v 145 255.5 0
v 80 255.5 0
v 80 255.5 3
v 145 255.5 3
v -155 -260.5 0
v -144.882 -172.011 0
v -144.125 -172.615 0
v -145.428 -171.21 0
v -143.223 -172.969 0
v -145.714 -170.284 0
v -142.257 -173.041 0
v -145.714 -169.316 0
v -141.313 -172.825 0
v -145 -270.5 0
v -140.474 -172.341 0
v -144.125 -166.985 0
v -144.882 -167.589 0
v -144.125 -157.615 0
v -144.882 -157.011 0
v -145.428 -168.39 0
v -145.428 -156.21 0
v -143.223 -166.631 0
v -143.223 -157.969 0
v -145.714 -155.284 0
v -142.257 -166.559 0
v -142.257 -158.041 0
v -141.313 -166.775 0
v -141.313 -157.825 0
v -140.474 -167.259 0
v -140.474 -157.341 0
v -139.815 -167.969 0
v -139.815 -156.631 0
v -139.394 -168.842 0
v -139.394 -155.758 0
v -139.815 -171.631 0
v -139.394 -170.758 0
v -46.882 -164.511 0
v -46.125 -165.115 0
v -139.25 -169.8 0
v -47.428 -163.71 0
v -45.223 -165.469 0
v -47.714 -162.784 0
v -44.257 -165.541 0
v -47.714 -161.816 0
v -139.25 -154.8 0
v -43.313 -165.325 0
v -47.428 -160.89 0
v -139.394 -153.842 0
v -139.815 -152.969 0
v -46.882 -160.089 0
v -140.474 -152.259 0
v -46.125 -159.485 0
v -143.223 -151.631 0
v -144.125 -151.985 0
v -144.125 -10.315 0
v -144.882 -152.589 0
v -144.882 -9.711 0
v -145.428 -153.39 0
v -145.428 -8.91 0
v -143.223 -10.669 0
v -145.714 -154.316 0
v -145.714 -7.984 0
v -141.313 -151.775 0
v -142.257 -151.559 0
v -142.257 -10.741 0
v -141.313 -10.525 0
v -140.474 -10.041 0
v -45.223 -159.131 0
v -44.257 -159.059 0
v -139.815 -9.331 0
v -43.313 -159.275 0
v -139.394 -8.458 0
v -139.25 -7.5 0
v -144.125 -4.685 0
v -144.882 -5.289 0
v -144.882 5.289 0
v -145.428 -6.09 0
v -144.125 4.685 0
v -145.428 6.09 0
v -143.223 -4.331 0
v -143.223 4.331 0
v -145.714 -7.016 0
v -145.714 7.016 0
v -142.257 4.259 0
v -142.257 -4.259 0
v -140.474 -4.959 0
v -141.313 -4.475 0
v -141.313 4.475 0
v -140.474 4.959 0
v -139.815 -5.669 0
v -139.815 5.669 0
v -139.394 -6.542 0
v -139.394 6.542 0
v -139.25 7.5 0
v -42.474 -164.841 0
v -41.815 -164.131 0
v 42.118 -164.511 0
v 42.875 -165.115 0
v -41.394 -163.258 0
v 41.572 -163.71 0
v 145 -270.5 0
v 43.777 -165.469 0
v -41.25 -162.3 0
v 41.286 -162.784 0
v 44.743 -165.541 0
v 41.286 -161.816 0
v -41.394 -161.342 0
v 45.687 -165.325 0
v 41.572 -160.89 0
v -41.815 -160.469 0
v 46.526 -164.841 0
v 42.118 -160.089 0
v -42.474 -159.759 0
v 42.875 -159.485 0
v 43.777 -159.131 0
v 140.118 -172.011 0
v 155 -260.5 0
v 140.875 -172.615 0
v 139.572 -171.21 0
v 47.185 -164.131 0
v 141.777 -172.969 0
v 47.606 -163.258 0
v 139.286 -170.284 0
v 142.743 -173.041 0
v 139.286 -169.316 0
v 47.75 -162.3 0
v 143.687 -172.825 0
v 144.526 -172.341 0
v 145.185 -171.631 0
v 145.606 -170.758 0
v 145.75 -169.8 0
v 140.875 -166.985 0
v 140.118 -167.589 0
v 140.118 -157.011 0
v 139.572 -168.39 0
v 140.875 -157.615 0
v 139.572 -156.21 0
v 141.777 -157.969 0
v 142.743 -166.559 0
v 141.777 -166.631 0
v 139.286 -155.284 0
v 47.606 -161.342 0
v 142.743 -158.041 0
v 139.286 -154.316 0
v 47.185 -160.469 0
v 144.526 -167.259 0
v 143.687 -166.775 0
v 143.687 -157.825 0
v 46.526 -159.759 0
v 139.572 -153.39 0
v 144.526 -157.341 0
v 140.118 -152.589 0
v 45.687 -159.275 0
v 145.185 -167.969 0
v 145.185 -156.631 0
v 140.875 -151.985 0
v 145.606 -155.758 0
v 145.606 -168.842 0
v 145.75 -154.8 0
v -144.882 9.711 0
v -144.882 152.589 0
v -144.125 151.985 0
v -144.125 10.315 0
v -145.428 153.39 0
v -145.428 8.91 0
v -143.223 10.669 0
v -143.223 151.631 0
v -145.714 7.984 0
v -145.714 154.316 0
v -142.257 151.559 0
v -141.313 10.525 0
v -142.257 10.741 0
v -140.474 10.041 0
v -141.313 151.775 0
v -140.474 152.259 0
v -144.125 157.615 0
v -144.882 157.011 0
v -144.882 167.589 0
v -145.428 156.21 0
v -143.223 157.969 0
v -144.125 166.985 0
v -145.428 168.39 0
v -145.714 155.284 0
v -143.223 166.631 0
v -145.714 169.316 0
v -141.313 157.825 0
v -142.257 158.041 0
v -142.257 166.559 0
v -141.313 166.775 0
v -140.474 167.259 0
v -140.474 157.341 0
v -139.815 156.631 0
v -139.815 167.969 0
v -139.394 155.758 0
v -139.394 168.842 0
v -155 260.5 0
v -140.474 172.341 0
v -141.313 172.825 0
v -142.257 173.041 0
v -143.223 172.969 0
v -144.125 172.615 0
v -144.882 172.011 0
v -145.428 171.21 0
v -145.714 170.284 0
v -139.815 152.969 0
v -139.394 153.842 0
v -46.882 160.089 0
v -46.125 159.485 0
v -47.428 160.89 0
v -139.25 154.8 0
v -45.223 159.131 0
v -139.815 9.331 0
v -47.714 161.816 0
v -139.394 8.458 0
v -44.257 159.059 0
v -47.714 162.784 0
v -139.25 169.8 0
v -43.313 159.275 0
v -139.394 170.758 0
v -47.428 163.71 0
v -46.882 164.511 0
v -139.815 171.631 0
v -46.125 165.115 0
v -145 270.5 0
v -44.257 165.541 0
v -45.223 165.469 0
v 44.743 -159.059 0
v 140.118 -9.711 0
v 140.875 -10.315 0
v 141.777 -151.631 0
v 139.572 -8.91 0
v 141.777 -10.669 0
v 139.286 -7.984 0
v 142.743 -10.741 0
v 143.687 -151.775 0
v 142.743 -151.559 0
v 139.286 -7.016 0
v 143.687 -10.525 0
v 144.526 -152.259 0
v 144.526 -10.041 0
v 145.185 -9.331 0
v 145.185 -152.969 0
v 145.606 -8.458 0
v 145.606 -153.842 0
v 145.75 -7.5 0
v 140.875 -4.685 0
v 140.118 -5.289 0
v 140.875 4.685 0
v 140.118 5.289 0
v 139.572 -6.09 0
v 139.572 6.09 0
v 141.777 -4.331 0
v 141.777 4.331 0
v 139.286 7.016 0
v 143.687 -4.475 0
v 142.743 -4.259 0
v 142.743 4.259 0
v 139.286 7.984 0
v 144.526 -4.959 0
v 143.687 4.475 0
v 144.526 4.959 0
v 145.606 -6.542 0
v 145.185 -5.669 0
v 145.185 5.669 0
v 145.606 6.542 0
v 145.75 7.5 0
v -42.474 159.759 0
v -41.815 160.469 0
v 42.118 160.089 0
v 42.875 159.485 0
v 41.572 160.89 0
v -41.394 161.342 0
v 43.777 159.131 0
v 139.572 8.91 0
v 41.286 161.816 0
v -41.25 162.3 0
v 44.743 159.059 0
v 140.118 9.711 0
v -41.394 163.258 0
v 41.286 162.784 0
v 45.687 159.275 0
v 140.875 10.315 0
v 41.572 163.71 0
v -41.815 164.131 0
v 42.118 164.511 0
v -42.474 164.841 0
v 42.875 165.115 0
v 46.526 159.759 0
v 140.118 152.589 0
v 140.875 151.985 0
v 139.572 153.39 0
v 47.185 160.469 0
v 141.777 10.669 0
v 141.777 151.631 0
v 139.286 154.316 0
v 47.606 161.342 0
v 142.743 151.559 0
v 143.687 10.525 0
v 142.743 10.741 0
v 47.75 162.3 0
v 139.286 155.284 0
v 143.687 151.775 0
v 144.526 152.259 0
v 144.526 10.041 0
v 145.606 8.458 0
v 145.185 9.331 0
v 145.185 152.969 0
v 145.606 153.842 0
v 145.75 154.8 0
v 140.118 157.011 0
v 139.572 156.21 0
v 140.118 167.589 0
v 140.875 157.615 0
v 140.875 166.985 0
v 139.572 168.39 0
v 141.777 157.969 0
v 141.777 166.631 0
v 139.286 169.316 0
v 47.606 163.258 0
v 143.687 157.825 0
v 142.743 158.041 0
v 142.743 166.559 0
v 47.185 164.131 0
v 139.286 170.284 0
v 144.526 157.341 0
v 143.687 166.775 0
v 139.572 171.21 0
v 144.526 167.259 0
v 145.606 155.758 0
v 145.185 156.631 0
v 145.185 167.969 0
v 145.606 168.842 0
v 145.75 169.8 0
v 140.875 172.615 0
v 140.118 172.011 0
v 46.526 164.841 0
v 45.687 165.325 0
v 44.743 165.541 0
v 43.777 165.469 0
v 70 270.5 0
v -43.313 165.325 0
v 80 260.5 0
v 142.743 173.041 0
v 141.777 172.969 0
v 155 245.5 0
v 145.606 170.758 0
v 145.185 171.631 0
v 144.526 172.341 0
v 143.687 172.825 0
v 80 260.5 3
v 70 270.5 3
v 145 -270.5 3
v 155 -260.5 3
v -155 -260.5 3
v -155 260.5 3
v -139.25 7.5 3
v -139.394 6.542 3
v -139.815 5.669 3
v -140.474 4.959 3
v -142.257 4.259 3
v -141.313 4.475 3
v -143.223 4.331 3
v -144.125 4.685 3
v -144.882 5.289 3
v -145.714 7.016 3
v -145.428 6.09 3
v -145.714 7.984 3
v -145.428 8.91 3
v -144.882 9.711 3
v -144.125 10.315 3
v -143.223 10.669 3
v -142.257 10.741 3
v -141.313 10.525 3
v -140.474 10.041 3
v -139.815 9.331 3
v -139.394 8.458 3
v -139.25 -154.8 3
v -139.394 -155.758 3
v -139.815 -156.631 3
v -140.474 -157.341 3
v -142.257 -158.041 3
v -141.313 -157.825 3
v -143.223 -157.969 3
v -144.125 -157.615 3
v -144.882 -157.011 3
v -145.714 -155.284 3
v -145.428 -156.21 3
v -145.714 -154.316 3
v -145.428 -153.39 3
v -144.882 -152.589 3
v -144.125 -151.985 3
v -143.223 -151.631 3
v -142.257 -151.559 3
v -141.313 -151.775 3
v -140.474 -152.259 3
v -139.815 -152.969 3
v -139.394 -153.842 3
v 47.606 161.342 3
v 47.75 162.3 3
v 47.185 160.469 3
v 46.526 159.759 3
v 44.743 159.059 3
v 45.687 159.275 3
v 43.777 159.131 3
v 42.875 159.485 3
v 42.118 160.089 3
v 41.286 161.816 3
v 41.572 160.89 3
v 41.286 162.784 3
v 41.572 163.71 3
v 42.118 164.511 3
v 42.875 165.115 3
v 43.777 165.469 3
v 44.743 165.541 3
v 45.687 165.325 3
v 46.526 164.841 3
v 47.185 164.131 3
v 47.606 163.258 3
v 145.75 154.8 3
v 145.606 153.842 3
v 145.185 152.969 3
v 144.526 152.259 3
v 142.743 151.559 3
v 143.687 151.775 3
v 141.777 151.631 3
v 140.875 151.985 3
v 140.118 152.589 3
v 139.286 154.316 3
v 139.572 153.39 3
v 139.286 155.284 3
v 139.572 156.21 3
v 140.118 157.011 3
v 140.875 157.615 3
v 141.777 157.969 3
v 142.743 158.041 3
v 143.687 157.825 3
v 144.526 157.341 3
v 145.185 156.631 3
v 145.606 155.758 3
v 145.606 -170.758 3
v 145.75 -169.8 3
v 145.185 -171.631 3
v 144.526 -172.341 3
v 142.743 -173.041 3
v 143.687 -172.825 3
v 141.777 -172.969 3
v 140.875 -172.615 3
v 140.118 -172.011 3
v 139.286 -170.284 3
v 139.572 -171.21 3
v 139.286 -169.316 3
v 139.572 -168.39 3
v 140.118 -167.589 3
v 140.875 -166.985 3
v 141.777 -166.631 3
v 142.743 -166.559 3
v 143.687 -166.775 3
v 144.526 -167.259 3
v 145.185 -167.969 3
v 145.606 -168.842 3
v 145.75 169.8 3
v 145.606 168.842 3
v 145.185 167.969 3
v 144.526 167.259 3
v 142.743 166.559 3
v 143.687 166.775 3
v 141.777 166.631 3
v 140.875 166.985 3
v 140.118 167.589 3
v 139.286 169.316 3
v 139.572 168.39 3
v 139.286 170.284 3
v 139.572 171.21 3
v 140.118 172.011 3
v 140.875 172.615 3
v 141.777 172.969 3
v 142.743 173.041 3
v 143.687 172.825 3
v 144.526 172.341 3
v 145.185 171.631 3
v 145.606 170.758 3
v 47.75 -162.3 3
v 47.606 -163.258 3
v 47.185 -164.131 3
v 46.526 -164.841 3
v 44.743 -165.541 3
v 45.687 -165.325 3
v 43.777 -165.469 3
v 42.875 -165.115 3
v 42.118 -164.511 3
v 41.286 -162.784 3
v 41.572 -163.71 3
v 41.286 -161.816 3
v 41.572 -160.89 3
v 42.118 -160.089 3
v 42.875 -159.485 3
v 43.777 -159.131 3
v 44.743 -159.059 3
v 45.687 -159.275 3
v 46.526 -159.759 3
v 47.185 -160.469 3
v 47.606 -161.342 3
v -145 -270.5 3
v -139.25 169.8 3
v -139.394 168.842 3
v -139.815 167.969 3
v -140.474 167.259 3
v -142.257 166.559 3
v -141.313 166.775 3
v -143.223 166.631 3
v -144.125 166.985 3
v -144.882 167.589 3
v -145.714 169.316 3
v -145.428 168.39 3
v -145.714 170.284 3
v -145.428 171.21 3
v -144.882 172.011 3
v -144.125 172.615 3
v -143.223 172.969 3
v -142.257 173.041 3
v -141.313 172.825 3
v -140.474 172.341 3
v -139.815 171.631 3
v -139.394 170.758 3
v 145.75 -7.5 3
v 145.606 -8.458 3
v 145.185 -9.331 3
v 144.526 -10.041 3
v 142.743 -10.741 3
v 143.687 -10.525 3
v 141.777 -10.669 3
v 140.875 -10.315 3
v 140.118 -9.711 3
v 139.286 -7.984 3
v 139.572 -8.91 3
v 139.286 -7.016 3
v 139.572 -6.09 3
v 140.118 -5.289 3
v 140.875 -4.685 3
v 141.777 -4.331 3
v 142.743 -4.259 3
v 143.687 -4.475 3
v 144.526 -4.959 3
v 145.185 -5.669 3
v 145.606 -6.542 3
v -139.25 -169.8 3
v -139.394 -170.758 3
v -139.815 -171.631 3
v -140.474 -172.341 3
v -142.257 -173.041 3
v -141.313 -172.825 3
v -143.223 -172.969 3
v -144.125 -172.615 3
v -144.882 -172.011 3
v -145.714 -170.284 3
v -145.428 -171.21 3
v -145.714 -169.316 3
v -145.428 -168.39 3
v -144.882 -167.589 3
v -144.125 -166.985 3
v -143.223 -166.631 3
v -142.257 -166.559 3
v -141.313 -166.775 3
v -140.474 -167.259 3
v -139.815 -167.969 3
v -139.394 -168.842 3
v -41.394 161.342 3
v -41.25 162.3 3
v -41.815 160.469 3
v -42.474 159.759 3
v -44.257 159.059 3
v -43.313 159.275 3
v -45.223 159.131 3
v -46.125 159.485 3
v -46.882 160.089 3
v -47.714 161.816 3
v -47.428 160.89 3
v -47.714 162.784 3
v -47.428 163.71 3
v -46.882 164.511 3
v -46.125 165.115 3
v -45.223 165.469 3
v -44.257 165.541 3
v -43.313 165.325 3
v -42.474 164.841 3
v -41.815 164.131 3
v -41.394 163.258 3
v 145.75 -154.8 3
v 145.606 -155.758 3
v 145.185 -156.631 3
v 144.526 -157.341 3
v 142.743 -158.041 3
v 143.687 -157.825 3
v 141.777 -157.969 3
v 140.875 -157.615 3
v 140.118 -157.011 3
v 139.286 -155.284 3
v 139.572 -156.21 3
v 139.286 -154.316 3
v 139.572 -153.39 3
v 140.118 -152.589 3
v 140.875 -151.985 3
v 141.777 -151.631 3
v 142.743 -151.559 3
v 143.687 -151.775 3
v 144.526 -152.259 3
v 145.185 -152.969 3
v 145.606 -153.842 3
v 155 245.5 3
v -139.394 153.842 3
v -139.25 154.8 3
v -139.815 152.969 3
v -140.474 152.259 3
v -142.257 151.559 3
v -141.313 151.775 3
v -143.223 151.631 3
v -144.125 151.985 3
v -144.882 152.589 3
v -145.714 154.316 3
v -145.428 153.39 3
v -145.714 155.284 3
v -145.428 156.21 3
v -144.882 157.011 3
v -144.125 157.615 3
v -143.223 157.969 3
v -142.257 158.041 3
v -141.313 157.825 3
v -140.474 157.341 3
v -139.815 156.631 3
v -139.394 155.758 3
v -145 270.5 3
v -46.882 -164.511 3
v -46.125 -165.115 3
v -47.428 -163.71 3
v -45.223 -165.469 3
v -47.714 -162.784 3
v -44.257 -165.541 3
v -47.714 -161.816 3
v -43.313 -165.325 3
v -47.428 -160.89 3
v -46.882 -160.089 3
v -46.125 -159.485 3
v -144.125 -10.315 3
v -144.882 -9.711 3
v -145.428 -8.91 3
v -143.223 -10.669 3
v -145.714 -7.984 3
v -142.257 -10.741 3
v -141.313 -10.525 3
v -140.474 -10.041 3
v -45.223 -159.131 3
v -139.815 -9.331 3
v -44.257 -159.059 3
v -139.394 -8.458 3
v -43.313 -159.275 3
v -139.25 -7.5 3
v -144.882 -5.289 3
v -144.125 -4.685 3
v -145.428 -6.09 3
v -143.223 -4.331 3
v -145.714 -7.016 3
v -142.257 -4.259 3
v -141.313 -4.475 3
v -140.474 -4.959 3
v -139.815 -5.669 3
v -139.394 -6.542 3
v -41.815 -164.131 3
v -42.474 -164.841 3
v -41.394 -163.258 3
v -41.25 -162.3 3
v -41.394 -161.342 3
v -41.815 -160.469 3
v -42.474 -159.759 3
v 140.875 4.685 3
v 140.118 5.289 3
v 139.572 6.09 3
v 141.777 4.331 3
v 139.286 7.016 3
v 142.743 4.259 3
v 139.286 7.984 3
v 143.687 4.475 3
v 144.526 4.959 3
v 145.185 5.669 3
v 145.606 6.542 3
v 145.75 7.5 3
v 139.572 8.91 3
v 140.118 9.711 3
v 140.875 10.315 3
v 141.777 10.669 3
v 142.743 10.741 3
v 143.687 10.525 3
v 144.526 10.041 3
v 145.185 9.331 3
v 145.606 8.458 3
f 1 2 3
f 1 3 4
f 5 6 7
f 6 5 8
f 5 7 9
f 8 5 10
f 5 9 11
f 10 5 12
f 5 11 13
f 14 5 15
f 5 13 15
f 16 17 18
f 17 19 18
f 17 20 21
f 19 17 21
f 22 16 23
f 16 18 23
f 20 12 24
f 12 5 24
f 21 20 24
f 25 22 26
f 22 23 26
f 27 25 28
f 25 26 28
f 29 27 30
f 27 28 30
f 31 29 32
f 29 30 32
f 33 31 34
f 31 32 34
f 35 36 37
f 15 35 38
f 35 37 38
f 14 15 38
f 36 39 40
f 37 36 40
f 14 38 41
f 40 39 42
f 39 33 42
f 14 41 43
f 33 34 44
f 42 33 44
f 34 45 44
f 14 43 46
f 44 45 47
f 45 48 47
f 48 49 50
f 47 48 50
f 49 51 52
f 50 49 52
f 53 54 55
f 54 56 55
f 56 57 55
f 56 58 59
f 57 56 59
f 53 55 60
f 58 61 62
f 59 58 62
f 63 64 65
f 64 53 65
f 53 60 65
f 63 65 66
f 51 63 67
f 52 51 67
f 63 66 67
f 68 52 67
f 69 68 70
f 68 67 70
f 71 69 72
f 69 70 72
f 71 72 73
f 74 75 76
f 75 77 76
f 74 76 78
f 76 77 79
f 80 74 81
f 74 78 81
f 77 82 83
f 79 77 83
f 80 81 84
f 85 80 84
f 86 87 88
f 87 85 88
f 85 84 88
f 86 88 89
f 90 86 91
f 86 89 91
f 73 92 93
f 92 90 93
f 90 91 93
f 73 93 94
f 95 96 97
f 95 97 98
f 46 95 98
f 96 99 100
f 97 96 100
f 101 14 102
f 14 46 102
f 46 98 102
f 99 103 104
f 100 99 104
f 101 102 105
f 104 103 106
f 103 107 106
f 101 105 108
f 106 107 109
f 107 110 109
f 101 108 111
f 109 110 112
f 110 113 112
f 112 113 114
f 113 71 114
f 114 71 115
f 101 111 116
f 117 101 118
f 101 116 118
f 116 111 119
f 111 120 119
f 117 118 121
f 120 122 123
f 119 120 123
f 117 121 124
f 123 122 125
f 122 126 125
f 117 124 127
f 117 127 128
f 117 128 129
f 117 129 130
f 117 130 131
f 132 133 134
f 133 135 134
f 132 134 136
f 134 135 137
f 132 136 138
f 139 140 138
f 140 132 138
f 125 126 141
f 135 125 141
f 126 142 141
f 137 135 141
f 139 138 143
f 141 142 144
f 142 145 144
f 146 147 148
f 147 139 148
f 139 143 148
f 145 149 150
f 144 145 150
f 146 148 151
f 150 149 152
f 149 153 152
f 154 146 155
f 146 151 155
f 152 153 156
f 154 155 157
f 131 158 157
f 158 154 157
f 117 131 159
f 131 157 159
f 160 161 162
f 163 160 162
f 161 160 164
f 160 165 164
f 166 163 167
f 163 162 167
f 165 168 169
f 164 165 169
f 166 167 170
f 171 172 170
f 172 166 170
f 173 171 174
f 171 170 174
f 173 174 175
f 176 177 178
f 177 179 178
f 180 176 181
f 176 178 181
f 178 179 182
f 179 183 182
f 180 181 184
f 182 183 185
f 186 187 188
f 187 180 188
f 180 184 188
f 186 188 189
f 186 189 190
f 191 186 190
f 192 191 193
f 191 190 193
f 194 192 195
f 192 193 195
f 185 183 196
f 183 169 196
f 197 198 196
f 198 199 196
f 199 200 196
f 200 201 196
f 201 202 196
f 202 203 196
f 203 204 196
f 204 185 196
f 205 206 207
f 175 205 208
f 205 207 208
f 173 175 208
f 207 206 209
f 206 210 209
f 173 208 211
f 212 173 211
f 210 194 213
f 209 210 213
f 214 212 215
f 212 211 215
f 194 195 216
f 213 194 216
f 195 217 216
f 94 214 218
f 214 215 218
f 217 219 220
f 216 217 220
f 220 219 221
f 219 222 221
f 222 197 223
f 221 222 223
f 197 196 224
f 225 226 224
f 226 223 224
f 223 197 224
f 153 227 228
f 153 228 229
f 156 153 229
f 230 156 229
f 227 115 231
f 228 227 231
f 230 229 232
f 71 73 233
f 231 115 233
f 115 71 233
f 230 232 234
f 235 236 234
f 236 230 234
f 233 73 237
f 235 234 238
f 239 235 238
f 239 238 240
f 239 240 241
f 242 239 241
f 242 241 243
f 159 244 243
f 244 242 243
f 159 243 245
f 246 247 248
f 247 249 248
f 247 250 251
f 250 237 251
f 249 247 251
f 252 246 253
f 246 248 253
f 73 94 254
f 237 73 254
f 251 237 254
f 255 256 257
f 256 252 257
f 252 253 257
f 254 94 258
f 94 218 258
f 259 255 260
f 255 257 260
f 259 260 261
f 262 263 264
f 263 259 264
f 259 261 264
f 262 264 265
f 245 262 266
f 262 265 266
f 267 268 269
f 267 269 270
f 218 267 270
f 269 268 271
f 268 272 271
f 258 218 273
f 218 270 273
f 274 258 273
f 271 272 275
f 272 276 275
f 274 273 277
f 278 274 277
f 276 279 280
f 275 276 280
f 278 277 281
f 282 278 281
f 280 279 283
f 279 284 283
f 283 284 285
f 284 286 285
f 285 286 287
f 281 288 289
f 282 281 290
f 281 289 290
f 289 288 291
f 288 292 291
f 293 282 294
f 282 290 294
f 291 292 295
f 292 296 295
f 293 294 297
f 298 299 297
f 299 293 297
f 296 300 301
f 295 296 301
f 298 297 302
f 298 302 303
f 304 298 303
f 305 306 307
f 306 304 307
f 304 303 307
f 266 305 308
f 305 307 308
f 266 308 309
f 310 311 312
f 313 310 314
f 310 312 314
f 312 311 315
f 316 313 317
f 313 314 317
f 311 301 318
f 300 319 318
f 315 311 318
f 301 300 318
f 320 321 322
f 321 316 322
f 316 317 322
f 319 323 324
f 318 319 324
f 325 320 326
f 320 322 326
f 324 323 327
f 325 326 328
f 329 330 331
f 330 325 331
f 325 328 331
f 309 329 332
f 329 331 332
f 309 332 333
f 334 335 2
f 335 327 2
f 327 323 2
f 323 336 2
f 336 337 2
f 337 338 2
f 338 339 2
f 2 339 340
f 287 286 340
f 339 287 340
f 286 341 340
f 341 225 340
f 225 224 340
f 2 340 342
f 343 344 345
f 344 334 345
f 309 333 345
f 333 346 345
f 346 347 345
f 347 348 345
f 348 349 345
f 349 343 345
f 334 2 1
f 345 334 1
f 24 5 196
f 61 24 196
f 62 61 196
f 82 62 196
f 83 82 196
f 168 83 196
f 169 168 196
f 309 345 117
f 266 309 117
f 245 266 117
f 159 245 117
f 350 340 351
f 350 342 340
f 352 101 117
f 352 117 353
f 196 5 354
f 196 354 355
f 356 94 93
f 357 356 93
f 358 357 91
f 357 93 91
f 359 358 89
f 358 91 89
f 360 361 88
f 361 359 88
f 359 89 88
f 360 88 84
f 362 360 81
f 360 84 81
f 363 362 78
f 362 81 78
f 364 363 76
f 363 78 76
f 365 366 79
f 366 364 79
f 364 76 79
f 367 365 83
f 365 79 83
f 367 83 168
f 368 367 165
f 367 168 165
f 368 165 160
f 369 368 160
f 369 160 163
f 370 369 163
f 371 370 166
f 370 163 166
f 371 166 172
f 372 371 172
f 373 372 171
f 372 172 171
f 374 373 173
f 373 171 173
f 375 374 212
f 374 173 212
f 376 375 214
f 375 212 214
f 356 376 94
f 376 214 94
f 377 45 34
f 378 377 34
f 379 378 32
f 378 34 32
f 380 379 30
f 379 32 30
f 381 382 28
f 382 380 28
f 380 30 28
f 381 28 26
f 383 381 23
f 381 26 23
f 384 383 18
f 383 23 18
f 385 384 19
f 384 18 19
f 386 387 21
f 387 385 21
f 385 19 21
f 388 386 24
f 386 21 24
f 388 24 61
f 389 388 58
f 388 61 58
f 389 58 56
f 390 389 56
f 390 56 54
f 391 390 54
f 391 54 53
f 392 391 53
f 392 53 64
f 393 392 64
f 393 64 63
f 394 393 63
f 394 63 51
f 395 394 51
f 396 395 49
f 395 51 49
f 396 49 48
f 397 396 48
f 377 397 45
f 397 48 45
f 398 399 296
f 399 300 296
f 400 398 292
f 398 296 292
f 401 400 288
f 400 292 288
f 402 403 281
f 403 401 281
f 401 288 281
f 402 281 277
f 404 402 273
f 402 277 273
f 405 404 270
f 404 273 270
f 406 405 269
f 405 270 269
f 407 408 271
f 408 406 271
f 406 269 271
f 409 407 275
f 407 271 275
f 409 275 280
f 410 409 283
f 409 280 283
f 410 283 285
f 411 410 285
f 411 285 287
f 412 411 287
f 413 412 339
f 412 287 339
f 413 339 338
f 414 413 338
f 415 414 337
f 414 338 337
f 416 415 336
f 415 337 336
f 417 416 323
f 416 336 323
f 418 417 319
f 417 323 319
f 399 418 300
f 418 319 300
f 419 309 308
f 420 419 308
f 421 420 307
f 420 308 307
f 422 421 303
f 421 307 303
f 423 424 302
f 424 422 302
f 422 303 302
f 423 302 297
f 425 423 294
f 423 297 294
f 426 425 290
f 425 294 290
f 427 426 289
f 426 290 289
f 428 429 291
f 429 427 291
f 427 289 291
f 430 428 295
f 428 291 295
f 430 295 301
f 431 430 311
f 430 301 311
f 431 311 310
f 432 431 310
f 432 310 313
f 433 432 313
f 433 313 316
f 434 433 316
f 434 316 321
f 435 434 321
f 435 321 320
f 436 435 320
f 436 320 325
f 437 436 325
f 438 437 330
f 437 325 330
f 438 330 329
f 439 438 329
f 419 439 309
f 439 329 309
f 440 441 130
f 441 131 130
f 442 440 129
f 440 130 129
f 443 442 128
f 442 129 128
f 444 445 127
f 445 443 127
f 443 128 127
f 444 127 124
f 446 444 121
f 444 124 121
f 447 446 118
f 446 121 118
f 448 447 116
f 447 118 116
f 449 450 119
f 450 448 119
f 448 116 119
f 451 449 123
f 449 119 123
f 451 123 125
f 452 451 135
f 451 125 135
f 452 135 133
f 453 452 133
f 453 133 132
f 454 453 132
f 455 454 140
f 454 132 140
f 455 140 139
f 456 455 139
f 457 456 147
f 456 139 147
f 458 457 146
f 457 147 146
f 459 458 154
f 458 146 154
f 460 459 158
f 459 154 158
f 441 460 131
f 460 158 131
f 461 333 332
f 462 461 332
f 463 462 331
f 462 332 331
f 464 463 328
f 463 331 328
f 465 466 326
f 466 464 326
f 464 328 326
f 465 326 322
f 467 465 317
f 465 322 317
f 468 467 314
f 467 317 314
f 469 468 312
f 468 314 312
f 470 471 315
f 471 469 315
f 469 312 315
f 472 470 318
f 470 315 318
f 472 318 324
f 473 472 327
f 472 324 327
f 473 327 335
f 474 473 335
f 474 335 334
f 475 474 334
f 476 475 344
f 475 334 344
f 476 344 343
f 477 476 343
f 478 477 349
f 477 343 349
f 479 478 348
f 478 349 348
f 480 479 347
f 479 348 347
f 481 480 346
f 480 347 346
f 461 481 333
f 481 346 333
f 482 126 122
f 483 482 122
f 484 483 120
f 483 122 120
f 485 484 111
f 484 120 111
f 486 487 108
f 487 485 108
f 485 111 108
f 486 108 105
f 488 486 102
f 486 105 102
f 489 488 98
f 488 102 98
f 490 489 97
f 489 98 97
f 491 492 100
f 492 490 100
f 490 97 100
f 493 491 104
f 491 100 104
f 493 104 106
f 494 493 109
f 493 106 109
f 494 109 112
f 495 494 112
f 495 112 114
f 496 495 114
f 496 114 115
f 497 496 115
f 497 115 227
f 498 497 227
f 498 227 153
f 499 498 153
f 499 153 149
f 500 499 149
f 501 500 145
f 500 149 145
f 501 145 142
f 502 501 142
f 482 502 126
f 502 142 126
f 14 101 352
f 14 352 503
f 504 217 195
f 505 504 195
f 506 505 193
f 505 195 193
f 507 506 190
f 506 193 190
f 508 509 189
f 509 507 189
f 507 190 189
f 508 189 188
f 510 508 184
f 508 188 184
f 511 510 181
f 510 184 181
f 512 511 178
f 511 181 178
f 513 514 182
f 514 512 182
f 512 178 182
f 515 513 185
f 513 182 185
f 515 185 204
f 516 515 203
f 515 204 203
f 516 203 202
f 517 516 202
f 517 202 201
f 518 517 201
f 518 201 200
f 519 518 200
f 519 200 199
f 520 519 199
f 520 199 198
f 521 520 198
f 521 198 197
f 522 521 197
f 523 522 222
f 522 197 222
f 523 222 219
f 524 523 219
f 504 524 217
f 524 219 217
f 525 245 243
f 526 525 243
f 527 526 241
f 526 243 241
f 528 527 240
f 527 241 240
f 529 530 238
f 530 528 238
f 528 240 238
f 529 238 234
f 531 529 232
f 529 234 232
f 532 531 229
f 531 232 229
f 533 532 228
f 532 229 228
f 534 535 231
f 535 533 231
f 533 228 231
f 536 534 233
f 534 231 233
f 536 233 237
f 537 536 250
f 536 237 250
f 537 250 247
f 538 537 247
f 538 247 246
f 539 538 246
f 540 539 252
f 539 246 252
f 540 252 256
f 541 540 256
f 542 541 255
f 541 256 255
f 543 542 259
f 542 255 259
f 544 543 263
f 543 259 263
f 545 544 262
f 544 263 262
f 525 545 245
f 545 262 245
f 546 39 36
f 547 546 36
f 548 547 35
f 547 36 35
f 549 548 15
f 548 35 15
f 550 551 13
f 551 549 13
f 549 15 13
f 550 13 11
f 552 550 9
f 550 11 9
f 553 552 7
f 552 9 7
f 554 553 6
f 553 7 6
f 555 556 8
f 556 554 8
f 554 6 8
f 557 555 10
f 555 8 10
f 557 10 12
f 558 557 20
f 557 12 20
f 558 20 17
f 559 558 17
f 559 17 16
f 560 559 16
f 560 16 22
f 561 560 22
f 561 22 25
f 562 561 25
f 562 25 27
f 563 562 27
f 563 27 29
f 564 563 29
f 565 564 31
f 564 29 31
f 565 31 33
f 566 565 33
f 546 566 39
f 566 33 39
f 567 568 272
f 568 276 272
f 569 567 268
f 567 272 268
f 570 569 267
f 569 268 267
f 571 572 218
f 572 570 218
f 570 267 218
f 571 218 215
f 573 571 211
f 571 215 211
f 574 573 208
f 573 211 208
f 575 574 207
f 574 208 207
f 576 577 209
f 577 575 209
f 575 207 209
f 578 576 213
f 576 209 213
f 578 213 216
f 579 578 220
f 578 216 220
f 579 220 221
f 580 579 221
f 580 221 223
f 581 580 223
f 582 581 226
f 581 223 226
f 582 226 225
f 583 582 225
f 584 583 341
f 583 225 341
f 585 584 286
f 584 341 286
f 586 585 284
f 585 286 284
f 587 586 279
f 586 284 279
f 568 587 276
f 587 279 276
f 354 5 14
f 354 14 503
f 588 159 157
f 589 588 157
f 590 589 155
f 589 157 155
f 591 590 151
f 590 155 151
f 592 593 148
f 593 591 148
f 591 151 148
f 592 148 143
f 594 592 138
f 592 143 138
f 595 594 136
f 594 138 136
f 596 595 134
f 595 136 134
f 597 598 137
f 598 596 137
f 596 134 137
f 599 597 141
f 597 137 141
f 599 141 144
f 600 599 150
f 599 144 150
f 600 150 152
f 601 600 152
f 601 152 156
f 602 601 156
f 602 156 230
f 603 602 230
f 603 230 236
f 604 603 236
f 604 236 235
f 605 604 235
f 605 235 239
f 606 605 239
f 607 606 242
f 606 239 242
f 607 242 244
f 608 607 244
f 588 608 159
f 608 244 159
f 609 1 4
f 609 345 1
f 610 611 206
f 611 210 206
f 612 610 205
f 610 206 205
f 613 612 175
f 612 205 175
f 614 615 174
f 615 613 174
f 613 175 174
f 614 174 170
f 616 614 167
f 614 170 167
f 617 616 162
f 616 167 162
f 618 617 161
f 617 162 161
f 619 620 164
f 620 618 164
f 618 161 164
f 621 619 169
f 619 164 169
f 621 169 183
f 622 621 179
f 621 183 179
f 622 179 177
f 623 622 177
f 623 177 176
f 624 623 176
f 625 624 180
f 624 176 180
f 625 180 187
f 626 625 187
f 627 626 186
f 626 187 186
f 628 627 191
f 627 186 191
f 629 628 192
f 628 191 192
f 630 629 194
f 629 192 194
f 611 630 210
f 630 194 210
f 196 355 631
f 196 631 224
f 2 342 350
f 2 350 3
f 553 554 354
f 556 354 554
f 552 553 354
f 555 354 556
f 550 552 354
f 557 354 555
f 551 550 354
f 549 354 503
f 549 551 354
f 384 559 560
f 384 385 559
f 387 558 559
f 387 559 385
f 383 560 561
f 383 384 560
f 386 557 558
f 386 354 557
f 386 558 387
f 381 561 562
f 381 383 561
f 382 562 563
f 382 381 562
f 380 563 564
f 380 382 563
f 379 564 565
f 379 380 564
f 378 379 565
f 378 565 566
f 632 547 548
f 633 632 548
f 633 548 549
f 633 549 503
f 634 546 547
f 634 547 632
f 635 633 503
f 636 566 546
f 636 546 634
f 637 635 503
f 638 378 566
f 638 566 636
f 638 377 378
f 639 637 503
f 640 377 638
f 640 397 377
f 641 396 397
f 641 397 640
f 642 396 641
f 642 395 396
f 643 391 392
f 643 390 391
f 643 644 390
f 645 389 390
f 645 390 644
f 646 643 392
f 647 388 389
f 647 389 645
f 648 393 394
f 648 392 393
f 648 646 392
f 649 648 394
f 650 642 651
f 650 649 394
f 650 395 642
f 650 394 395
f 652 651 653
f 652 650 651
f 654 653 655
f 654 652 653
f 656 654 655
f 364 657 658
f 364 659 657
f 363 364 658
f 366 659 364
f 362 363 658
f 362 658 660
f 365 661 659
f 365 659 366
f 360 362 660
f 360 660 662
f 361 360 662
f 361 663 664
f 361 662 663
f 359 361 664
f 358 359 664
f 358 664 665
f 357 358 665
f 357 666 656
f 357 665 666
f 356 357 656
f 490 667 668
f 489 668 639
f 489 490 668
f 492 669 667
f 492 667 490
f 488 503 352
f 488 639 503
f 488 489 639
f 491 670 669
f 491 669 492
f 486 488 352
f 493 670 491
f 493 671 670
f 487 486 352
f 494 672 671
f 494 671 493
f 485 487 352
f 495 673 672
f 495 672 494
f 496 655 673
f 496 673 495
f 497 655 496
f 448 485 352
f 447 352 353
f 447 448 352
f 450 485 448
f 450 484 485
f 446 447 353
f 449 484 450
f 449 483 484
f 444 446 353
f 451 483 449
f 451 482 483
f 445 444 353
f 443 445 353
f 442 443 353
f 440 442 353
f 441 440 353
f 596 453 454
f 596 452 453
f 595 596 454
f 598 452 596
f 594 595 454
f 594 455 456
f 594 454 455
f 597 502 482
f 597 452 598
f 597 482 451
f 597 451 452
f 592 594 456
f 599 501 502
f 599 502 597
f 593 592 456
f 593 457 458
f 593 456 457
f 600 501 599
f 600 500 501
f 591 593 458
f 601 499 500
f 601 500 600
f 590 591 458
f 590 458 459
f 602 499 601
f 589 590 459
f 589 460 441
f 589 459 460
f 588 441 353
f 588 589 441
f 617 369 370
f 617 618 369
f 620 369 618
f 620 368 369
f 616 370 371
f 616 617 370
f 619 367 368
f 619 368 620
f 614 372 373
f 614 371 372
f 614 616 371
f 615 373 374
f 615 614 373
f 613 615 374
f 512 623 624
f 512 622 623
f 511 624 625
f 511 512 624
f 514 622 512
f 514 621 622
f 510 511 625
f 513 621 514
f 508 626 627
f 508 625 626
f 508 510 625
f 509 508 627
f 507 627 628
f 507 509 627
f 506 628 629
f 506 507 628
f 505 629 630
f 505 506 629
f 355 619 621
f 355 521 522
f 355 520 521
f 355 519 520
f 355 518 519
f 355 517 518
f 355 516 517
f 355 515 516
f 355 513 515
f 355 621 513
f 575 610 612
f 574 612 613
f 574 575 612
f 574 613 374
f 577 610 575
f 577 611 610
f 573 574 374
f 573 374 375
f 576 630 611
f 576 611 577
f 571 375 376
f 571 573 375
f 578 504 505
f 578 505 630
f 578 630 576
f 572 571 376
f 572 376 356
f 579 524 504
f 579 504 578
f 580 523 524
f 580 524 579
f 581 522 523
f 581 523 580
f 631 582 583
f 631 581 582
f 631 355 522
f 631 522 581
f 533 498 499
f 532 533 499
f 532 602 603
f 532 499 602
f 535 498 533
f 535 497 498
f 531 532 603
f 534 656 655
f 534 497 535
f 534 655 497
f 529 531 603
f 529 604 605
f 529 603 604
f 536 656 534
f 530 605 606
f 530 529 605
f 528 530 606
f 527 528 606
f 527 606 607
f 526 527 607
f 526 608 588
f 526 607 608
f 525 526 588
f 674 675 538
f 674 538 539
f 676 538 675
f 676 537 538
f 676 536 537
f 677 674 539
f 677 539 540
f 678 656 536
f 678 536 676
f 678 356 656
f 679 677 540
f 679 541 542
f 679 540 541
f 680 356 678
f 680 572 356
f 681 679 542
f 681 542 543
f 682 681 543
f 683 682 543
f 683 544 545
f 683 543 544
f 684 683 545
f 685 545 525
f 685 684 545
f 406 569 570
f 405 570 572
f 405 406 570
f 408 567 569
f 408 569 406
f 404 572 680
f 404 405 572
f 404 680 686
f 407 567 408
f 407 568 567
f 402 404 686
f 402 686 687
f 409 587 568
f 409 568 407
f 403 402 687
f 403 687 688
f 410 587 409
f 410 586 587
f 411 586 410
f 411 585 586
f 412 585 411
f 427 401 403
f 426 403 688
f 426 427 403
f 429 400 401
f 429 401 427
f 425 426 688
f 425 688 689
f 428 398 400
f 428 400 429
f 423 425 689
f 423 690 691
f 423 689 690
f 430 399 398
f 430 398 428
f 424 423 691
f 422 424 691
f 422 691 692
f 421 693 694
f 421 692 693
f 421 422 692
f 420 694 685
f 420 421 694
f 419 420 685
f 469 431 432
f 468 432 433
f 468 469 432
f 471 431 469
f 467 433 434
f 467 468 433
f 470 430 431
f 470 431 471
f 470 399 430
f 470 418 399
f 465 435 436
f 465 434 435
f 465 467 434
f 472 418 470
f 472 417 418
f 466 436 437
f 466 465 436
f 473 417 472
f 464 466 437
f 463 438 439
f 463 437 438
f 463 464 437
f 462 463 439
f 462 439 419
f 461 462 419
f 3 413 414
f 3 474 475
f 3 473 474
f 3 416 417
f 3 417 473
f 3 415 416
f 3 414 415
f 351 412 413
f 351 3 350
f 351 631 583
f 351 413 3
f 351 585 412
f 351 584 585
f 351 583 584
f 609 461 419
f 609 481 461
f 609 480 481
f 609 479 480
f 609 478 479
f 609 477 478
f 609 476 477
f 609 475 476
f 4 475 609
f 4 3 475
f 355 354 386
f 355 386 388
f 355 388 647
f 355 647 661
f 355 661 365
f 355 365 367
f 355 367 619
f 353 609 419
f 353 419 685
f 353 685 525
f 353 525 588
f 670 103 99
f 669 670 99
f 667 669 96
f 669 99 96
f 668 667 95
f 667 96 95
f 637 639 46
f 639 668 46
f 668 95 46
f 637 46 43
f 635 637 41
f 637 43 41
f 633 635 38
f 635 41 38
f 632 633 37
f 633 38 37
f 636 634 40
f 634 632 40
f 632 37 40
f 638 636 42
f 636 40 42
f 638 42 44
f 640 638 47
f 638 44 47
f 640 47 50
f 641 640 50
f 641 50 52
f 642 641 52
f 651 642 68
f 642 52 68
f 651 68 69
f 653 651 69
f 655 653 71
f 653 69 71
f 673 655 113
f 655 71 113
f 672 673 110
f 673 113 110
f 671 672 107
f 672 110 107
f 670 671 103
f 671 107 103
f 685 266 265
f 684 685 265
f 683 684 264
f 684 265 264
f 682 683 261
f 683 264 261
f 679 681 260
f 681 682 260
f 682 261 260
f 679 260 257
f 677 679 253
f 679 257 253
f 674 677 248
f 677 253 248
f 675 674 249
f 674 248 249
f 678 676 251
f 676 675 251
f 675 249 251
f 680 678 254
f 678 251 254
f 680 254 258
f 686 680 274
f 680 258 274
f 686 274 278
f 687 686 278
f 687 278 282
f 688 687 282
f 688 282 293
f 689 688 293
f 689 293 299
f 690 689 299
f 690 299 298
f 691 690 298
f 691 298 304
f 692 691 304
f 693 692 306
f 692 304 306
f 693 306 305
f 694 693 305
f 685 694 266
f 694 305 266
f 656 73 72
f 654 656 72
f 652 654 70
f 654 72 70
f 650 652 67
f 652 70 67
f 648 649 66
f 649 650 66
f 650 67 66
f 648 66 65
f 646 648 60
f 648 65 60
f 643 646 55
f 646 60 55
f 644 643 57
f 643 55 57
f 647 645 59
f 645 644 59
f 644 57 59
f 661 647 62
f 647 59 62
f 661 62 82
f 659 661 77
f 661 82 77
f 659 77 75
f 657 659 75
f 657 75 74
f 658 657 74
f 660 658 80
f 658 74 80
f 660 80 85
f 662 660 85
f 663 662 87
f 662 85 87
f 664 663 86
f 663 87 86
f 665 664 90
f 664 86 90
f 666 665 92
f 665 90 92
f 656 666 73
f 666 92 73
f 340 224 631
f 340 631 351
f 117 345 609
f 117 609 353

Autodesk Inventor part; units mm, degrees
ref_plane "YZ Plane" through (0, 0, 0) normal (1, 0, 0) x (0, 1, 0)
ref_plane "XZ Plane" through (0, 0, 0) normal (0, 1, 0) x (-1, 0, 0)
ref_plane "XY Plane" through (0, 0, 0) normal (0, 0, 1) x (1, 0, 0)
sketch "Skizze1" plane through (0, 0, 0) normal (0, 0, 1) x (1, 0, 0)
  line L0 (-155, 270.5) -> (155, 270.5)
  line L1 (155, 270.5) -> (155, -270.5)
  line L2 (155, -270.5) -> (-155, -270.5)
  line L3 (-155, -270.5) -> (-155, 270.5)
  line L4 (-155, 270.5) -> (155, -270.5) construction
  line L5 (155, 270.5) -> (-155, -270.5) construction
  line L6 (-77.5, 270.5) -> (-77.5, -270.5) construction
  line L7 (0, 396.7) -> (0, -381.7) construction
  line L8 (-142.5, 270.5) -> (-142.5, -270.5) construction
  line L9 (-155, -162.3) -> (155, -162.3) construction
  circle A0 centre (-142.5, -154.8) radius 3.25
  circle A1 centre (-142.5, -169.8) radius 3.25
  line L10 (-232, 0) -> (307, 0) construction
  circle A2 centre (-142.5, 7.5) radius 3.25
  circle A3 centre (-142.5, -7.5) radius 3.25
  circle A4 centre (-142.5, 154.8) radius 3.25
  circle A5 centre (-142.5, 169.8) radius 3.25
  circle A6 centre (142.5, -154.8) radius 3.25
  circle A7 centre (142.5, -169.8) radius 3.25
  circle A8 centre (142.5, 7.5) radius 3.25
  circle A9 centre (142.5, -7.5) radius 3.25
  circle A10 centre (142.5, 169.8) radius 3.25
  circle A11 centre (142.5, 154.8) radius 3.25
  circle A12 centre (-44.5, -162.3) radius 3.25
  circle A13 centre (44.5, -162.3) radius 3.25
  circle A14 centre (-44.5, 162.3) radius 3.25
  circle A15 centre (44.5, 162.3) radius 3.25
  line L11 (230, 285.5) -> (80, 285.5) construction
  line L12 (80, 285.5) -> (80, 255.5)
  line L13 (80, 255.5) -> (230, 255.5)
  line L14 (230, 255.5) -> (230, 285.5) construction
  line L15 (230, 285.5) -> (80, 255.5) construction
  line L16 (80, 285.5) -> (230, 255.5) construction
  point P0 (0, 0)
  point P1 (155, 255.5)
  point P2 (80, 270.5)
  dimension "d0" = 541
  dimension "d1" = 310
  dimension "d2" = 77.5
  dimension "d3" = 12.5
  dimension "d4" = 108.2
  dimension "d5" = 6.5
  dimension "d6" = 7.5
  dimension "d7" = 6.5
  dimension "d8" = 7.5
  dimension "d9" = 7.5
  dimension "d10" = 6.5
  dimension "d11" = 6.5
  dimension "d12" = 44.5
  dimension "d15" = 150
  dimension "d16" = 15
extrude "Extrusion1" add sketch "Skizze1" along normal blind 3 contours L0 L12 L13 L1 L2 L3
chamfer "Fase1" distance 10 angle 45 5 edges at (80, 270.5, 1.5) (155, 255.5, 1.5) (155, -270.5, 1.5) (-155, -270.5, 1.5) (-155, 270.5, 1.5)
equation "\"d2\" = 0.25 * d1"
equation "\"d4\" = 0.2 * d0"
equation "\"d7\" = d5"
equation "\"d8\" = d6"
equation "\"d9\" = d6"
equation "\"d10\" = d5"
properties part number "enc-BackPanel Mitte"
